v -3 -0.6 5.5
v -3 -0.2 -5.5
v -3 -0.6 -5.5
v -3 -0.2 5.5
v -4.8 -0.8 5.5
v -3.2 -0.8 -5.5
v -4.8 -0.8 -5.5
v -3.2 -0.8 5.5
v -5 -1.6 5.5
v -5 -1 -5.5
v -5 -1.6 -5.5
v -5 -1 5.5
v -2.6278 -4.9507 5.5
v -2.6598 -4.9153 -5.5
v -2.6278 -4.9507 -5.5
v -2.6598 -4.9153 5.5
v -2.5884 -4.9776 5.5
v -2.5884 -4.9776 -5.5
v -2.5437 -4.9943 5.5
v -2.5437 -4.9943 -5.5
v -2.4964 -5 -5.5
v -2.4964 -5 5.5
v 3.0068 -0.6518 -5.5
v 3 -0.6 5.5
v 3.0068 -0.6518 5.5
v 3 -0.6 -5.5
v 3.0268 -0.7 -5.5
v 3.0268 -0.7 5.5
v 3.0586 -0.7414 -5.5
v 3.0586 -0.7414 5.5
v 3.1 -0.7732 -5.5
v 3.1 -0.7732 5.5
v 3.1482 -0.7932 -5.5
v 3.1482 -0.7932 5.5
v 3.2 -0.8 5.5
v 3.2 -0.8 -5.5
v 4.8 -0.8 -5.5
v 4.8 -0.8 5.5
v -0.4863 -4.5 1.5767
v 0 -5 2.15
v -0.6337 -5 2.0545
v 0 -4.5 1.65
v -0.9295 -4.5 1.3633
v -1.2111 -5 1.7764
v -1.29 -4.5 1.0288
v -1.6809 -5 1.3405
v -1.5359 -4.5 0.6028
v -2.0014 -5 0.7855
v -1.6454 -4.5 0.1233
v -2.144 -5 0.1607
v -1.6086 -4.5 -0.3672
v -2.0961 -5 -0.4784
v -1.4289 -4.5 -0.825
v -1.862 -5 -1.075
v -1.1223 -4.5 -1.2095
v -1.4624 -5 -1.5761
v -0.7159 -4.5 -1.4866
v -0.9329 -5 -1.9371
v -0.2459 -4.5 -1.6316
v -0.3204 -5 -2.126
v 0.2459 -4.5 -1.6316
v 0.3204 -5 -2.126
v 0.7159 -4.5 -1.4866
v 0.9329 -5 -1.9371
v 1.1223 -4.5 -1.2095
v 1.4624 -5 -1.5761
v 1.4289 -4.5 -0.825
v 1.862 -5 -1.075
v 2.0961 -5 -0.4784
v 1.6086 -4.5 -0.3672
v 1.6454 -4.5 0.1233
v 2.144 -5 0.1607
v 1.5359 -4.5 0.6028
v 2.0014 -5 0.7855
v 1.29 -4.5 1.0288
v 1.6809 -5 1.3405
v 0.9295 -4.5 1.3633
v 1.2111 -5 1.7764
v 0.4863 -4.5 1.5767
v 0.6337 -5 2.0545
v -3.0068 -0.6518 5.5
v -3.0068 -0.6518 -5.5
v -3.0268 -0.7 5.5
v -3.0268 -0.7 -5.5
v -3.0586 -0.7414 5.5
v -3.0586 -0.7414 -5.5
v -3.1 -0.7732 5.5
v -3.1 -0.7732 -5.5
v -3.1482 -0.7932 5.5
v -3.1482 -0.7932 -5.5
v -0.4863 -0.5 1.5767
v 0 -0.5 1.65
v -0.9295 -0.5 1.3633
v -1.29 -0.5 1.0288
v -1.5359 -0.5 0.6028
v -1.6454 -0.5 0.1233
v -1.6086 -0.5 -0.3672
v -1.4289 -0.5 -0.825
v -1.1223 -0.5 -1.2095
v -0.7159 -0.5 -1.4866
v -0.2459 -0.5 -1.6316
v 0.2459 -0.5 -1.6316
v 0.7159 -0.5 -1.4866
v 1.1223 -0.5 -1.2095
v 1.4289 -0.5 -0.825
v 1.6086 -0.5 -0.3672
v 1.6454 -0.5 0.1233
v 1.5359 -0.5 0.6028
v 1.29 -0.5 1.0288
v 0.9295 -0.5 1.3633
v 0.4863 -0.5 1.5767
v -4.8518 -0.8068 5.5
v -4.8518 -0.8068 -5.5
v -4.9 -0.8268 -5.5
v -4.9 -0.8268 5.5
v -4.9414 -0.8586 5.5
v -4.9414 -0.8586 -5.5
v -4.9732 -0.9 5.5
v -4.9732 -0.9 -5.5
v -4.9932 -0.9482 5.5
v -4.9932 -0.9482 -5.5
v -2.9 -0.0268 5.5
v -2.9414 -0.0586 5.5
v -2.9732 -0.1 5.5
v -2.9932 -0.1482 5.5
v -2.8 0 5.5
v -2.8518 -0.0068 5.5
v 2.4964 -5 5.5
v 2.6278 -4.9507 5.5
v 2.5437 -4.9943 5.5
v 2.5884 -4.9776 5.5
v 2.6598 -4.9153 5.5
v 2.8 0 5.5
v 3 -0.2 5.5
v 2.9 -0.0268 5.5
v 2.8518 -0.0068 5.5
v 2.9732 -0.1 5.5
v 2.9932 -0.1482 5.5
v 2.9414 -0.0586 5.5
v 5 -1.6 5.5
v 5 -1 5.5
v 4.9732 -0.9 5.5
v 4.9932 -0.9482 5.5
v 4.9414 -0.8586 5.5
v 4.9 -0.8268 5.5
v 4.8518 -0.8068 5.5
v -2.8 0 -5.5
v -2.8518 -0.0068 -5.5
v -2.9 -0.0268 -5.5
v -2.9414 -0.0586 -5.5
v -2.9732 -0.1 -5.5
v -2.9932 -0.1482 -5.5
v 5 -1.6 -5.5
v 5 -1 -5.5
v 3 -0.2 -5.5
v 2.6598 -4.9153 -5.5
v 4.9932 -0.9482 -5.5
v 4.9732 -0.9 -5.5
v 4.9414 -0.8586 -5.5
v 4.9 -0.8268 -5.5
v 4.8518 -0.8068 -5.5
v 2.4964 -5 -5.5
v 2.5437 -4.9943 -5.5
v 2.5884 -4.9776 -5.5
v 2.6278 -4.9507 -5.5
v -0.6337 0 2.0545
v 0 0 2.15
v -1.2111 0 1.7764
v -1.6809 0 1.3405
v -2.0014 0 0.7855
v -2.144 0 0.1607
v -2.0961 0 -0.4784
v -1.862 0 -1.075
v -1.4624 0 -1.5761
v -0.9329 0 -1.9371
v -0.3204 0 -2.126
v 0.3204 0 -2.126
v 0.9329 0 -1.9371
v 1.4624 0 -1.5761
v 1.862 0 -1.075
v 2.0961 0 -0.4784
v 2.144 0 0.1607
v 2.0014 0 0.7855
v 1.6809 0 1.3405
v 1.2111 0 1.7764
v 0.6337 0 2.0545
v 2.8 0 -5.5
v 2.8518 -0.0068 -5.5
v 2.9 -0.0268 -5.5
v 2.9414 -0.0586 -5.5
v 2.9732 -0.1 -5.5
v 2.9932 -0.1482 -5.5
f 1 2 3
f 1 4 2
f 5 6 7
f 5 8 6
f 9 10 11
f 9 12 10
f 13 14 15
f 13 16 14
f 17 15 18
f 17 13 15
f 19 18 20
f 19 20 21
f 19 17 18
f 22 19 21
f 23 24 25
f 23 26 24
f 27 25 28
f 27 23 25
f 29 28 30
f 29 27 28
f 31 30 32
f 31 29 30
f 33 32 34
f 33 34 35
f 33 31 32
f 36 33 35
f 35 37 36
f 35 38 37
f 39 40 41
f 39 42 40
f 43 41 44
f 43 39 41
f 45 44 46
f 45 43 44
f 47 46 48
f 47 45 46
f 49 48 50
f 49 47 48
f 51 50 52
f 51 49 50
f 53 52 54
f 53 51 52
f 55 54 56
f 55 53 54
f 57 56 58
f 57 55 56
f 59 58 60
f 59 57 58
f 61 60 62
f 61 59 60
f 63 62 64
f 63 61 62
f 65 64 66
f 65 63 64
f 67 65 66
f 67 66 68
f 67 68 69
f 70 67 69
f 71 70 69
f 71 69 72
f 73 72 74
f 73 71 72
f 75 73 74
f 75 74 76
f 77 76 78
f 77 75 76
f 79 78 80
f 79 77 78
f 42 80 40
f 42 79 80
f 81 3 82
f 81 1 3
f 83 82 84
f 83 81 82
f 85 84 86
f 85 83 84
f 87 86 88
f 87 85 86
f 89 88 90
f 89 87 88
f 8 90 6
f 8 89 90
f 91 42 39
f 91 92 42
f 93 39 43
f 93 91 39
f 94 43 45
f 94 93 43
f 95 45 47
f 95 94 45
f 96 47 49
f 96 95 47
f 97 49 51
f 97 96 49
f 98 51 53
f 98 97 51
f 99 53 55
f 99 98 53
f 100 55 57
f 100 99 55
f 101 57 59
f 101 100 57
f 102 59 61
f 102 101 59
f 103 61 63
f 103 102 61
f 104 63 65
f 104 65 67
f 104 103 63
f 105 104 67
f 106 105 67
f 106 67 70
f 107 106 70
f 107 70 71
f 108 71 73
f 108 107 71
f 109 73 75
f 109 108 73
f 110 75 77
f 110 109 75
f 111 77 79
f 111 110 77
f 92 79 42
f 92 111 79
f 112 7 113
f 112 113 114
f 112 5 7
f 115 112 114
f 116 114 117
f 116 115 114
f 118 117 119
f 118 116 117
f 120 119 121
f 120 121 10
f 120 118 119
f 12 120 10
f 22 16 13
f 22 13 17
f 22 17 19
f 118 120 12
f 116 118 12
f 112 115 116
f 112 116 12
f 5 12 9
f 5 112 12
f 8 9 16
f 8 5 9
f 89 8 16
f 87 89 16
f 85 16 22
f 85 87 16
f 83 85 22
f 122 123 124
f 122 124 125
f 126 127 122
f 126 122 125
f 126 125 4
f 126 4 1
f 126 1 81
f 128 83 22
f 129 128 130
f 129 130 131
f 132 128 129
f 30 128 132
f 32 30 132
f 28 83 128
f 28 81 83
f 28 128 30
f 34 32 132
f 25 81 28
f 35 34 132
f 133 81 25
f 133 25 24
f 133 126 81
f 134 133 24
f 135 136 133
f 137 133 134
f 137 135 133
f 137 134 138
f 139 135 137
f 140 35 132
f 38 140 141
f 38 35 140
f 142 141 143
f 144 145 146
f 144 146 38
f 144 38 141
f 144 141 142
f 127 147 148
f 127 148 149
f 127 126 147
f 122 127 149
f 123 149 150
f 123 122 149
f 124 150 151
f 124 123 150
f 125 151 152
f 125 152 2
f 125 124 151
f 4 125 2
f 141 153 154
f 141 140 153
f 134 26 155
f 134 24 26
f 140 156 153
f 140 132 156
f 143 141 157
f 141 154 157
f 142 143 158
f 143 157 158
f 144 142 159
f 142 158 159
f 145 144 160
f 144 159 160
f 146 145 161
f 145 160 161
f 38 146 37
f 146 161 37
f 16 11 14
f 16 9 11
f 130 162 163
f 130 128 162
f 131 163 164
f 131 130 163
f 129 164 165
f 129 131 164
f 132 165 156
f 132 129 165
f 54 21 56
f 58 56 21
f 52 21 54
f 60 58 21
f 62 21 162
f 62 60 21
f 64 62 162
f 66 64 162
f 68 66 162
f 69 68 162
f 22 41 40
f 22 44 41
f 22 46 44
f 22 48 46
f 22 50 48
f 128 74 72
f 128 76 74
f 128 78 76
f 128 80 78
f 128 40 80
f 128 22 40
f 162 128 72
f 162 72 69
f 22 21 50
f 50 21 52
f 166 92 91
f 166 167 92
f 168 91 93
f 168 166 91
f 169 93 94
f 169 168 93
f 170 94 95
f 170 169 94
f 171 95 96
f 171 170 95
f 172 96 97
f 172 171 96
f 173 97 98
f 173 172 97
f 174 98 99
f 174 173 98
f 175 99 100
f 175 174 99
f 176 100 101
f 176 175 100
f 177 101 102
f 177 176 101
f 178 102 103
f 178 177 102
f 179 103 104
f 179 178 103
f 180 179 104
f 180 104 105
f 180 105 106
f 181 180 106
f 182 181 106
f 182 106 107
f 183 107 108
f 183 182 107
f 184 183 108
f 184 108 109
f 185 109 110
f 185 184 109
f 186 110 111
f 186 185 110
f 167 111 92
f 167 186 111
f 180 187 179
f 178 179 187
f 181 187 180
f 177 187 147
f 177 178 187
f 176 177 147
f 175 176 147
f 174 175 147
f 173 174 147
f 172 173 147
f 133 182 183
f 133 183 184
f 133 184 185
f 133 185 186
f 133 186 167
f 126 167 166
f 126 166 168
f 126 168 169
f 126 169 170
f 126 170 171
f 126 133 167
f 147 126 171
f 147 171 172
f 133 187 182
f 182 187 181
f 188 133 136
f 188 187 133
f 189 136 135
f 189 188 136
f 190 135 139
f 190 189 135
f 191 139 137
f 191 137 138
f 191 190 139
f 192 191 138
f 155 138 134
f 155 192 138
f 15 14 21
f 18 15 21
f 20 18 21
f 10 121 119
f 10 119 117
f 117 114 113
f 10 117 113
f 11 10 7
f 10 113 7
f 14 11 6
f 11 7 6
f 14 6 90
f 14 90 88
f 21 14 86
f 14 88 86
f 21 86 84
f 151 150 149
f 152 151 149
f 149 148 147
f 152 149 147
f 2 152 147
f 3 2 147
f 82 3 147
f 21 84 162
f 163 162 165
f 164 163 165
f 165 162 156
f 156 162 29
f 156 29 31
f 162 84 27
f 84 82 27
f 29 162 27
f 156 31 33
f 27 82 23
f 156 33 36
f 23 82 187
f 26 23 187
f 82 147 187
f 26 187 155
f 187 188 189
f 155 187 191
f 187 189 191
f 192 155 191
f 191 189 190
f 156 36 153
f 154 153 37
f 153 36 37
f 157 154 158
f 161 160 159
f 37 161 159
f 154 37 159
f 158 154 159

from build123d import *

# Parameters (mm, degrees)
EXTRUDE_1_DEPTH = 5.5
FILLET_1_R      = 0.2


with BuildPart() as part:
    # Эскиз1 → Бобышка-Вытянуть1 (new body, symmetric)
    with BuildSketch(Plane.XY):
        Polygon((3, 0), (-3, 0), (-3, -0.8), (-5, -0.8), (-5, -1.6), (-2.6, -5), (2.6, -5), (5, -1.6), (5, -0.8), (3, -0.8), align=None)
    extrude(amount=EXTRUDE_1_DEPTH, both=True)

    # Эскиз4 → Отверстие обработанное метчиком M41 (revolve, cut)
    with BuildSketch(Plane(origin=(0, 0, 0), x_dir=(0, 0, 1), z_dir=(1, 0, 0))):
        Polygon((0, 0), (0, 5), (2.15, 5), (1.65, 4.5), (1.65, 0.5), (2.15, 0), align=None)
    revolve(axis=Axis((0, 6.35, 0), (0, -1, 0)), mode=Mode.SUBTRACT)

    # Скругление1
    fillet_1_edges = [part.edges().sort_by_distance(p)[0] for p in [
        (-3, 0, 0),
        (3, 0, 0),
        (3, -0.8, 0),
        (5, -0.8, 0),
        (2.6, -5, 0),
        (-2.6, -5, 0),
        (-5, -0.8, 0),
        (-3, -0.8, 0),
    ]]
    fillet(fillet_1_edges, radius=FILLET_1_R)


solid = part.part
